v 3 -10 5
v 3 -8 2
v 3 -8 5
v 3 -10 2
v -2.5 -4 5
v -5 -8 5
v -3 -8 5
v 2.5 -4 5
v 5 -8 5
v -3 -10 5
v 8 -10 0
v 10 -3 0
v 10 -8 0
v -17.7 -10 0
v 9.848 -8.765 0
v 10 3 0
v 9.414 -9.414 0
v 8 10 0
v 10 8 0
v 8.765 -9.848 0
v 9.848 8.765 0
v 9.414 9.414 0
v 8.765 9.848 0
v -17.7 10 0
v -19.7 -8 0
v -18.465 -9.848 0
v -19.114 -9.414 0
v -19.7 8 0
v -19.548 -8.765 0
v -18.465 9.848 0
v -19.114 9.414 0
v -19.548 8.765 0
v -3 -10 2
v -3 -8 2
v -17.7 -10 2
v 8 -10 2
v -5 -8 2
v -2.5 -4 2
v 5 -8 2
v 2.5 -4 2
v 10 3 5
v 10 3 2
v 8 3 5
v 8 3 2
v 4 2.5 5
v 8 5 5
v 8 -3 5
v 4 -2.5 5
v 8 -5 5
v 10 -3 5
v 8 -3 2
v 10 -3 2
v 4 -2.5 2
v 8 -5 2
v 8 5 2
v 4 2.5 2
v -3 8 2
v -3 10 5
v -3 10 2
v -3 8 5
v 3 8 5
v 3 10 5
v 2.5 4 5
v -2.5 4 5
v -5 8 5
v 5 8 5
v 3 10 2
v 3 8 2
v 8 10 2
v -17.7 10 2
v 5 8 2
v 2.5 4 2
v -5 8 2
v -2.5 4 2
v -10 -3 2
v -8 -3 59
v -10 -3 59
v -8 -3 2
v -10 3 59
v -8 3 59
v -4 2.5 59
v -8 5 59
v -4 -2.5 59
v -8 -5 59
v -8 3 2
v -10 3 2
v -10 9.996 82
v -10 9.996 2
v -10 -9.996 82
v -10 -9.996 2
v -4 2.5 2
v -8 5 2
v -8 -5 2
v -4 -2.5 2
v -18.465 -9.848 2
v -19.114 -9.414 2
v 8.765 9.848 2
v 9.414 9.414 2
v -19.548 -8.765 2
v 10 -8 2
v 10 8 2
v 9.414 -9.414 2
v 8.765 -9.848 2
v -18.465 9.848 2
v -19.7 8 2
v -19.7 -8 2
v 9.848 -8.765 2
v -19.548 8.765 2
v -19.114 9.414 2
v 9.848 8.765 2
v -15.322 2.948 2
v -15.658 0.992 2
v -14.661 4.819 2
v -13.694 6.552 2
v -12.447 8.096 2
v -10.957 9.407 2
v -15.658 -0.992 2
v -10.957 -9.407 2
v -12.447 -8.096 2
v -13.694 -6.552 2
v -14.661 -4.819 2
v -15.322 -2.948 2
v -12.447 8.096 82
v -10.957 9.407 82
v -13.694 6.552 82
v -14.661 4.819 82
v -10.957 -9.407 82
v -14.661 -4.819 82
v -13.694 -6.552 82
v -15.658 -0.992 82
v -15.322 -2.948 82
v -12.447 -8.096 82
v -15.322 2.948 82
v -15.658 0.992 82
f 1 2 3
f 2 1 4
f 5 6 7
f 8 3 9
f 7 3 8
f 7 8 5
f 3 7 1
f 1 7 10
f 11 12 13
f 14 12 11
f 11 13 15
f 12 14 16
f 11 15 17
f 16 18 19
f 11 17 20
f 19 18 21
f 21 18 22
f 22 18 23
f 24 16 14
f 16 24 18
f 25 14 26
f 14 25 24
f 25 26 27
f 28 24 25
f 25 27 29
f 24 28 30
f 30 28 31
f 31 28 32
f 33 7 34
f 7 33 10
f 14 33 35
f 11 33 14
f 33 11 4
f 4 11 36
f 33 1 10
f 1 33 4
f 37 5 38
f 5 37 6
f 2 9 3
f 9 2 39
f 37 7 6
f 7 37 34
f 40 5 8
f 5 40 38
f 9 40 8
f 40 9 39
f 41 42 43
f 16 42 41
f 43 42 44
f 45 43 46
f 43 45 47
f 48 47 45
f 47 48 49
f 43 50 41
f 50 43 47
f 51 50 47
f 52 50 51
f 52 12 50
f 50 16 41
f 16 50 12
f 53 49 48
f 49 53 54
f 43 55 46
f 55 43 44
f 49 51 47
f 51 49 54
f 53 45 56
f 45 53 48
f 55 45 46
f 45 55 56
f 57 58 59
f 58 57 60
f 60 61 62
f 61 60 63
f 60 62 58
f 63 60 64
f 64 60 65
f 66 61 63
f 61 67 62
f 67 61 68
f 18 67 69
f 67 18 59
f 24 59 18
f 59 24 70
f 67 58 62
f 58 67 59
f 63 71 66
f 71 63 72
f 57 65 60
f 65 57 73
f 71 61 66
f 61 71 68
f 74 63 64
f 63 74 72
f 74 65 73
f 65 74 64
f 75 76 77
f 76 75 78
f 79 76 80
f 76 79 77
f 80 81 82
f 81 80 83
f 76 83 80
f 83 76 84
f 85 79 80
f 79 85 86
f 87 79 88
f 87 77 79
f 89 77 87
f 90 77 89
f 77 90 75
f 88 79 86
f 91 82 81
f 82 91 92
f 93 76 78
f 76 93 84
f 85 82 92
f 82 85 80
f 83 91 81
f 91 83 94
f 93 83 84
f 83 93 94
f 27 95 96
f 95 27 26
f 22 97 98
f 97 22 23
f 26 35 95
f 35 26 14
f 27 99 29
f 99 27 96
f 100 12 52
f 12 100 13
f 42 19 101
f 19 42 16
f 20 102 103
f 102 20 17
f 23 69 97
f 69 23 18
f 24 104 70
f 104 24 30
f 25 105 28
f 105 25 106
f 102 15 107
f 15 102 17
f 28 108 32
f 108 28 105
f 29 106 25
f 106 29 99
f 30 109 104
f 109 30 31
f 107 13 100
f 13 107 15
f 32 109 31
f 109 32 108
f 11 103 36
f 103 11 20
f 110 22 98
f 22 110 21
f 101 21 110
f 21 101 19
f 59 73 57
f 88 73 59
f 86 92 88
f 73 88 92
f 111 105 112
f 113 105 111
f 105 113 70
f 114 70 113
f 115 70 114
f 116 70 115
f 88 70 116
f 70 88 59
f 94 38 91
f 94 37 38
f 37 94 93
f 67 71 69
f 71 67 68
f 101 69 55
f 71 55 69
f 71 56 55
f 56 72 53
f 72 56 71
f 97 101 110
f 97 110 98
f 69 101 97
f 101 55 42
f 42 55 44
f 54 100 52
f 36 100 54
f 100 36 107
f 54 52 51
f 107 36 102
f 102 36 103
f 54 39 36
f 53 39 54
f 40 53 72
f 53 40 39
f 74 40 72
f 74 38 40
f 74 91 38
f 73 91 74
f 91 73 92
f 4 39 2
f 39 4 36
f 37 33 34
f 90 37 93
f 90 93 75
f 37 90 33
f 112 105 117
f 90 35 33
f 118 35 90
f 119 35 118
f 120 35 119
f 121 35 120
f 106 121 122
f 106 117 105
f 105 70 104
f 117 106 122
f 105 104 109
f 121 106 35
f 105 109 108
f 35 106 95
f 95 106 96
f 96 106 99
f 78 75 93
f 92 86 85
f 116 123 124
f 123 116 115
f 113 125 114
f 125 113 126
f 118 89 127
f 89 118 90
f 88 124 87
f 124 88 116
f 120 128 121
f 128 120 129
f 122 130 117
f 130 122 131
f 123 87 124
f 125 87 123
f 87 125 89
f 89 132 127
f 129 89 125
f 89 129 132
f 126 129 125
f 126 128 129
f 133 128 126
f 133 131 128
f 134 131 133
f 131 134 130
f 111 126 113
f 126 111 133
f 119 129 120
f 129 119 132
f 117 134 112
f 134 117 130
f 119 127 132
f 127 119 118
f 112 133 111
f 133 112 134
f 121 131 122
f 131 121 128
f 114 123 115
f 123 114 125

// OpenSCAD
// adopted from http://www.thingiverse.com/thing:43756

/* [Extrusion] */
extrusion_width=20; // width of the exstrusion
slot_width=6; // width od the slot in the rail
slot_thickness=1; // material thickness
t_width=6; //  width of the slot
t_depth=1;             
trap_bot_width=10; // width of the bottom of the slot
trap_top_width=5; // width of the top of the slot
trap_depth=4; // depth of the slot

/* [End Cap] */
cover_thickness=2; // desired thickness of the endstop
corner_rounding=2; // radius of the corner on endstop

hole_size=0; // set hole size > 0, i.e. = 5 if you want a hole in the center of the end-stop

tab_height=5; // height/depth of the tabs

undersize=0; //this may need be adjusted for a good fit

/* [Spool Rest] */
spool_rest_length=80; // length of the top glide area for the filament spool
corner_mount_clearance=21; // add clearing for any corner hardware
spool_endstop_height=8; // height of the endstop (including the hight of the spool glide area)
adjust_spool_rest_radius=1.7; // change the radious of the spool rest, to match the width of the end-stop

difference() {
    union() {
        union() {
            for (a=[0:3])
                rotate([0,0,90*a])
                    translate([0,-extrusion_width/2,0])
                        if (a==3)
                            t_slot(spool_rest_length - corner_mount_clearance);
                        else
                            t_slot(tab_height);
            translate([-extrusion_width/2+corner_rounding-spool_endstop_height-adjust_spool_rest_radius, -extrusion_width/2+corner_rounding,0])
                minkowski() {
                    cube([extrusion_width-corner_rounding*2+spool_endstop_height+adjust_spool_rest_radius,extrusion_width-corner_rounding*2,cover_thickness-1]);
                    cylinder(r=corner_rounding, h=1, $fn=16);
                }
        }
        
        linear_extrude(height=spool_rest_length+cover_thickness) {
            // calculate the center offset
            radius=extrusion_width/2;
            translate([-spool_endstop_height/2,0,0]) {
                difference() {
                    circle(radius+adjust_spool_rest_radius, $fa=4);
                    translate([-radius+spool_endstop_height/2,-radius*5,0])
                        square(size=[radius*10,radius*10], center=false);
                }
            }
        }
    }
    
    // uncomment line below to add a center hole in the end cap
    if (hole_size>0)
        cylinder(r=hole_size/2, h=cover_thickness*4, center=true);
}

module t_slot(zheight=tab_height) {
	translate([-slot_width/2+undersize/2,0,0])
		cube([slot_width-undersize, slot_thickness+t_depth,zheight]);
	translate([-t_width/2+undersize/2,slot_thickness,0])
		cube([t_width-undersize,t_depth-undersize+0.01,zheight]);
	translate([0,slot_thickness+t_depth-undersize,0])
		linear_extrude(height=zheight)
			trapezoid(bottom=trap_bot_width-undersize, top=trap_top_width-undersize, height=trap_depth-undersize);
}

module trapezoid(bottom=10, top=5, height=2)
{
	polygon(points=[[-bottom/2,0],[bottom/2,0],[top/2,height],[-top/2,height]]);
}

module topCylinder() {
  //  intersection() {
  //      circle(r=(spool_hole_diameter - spool_rest_diameter_undersize)/2);
        translate(-(extrusion_width/2),extrusion_width/2,0);
            square(size=[extrusion_width,extrusion_width/2], center=false);
  //  }
}
